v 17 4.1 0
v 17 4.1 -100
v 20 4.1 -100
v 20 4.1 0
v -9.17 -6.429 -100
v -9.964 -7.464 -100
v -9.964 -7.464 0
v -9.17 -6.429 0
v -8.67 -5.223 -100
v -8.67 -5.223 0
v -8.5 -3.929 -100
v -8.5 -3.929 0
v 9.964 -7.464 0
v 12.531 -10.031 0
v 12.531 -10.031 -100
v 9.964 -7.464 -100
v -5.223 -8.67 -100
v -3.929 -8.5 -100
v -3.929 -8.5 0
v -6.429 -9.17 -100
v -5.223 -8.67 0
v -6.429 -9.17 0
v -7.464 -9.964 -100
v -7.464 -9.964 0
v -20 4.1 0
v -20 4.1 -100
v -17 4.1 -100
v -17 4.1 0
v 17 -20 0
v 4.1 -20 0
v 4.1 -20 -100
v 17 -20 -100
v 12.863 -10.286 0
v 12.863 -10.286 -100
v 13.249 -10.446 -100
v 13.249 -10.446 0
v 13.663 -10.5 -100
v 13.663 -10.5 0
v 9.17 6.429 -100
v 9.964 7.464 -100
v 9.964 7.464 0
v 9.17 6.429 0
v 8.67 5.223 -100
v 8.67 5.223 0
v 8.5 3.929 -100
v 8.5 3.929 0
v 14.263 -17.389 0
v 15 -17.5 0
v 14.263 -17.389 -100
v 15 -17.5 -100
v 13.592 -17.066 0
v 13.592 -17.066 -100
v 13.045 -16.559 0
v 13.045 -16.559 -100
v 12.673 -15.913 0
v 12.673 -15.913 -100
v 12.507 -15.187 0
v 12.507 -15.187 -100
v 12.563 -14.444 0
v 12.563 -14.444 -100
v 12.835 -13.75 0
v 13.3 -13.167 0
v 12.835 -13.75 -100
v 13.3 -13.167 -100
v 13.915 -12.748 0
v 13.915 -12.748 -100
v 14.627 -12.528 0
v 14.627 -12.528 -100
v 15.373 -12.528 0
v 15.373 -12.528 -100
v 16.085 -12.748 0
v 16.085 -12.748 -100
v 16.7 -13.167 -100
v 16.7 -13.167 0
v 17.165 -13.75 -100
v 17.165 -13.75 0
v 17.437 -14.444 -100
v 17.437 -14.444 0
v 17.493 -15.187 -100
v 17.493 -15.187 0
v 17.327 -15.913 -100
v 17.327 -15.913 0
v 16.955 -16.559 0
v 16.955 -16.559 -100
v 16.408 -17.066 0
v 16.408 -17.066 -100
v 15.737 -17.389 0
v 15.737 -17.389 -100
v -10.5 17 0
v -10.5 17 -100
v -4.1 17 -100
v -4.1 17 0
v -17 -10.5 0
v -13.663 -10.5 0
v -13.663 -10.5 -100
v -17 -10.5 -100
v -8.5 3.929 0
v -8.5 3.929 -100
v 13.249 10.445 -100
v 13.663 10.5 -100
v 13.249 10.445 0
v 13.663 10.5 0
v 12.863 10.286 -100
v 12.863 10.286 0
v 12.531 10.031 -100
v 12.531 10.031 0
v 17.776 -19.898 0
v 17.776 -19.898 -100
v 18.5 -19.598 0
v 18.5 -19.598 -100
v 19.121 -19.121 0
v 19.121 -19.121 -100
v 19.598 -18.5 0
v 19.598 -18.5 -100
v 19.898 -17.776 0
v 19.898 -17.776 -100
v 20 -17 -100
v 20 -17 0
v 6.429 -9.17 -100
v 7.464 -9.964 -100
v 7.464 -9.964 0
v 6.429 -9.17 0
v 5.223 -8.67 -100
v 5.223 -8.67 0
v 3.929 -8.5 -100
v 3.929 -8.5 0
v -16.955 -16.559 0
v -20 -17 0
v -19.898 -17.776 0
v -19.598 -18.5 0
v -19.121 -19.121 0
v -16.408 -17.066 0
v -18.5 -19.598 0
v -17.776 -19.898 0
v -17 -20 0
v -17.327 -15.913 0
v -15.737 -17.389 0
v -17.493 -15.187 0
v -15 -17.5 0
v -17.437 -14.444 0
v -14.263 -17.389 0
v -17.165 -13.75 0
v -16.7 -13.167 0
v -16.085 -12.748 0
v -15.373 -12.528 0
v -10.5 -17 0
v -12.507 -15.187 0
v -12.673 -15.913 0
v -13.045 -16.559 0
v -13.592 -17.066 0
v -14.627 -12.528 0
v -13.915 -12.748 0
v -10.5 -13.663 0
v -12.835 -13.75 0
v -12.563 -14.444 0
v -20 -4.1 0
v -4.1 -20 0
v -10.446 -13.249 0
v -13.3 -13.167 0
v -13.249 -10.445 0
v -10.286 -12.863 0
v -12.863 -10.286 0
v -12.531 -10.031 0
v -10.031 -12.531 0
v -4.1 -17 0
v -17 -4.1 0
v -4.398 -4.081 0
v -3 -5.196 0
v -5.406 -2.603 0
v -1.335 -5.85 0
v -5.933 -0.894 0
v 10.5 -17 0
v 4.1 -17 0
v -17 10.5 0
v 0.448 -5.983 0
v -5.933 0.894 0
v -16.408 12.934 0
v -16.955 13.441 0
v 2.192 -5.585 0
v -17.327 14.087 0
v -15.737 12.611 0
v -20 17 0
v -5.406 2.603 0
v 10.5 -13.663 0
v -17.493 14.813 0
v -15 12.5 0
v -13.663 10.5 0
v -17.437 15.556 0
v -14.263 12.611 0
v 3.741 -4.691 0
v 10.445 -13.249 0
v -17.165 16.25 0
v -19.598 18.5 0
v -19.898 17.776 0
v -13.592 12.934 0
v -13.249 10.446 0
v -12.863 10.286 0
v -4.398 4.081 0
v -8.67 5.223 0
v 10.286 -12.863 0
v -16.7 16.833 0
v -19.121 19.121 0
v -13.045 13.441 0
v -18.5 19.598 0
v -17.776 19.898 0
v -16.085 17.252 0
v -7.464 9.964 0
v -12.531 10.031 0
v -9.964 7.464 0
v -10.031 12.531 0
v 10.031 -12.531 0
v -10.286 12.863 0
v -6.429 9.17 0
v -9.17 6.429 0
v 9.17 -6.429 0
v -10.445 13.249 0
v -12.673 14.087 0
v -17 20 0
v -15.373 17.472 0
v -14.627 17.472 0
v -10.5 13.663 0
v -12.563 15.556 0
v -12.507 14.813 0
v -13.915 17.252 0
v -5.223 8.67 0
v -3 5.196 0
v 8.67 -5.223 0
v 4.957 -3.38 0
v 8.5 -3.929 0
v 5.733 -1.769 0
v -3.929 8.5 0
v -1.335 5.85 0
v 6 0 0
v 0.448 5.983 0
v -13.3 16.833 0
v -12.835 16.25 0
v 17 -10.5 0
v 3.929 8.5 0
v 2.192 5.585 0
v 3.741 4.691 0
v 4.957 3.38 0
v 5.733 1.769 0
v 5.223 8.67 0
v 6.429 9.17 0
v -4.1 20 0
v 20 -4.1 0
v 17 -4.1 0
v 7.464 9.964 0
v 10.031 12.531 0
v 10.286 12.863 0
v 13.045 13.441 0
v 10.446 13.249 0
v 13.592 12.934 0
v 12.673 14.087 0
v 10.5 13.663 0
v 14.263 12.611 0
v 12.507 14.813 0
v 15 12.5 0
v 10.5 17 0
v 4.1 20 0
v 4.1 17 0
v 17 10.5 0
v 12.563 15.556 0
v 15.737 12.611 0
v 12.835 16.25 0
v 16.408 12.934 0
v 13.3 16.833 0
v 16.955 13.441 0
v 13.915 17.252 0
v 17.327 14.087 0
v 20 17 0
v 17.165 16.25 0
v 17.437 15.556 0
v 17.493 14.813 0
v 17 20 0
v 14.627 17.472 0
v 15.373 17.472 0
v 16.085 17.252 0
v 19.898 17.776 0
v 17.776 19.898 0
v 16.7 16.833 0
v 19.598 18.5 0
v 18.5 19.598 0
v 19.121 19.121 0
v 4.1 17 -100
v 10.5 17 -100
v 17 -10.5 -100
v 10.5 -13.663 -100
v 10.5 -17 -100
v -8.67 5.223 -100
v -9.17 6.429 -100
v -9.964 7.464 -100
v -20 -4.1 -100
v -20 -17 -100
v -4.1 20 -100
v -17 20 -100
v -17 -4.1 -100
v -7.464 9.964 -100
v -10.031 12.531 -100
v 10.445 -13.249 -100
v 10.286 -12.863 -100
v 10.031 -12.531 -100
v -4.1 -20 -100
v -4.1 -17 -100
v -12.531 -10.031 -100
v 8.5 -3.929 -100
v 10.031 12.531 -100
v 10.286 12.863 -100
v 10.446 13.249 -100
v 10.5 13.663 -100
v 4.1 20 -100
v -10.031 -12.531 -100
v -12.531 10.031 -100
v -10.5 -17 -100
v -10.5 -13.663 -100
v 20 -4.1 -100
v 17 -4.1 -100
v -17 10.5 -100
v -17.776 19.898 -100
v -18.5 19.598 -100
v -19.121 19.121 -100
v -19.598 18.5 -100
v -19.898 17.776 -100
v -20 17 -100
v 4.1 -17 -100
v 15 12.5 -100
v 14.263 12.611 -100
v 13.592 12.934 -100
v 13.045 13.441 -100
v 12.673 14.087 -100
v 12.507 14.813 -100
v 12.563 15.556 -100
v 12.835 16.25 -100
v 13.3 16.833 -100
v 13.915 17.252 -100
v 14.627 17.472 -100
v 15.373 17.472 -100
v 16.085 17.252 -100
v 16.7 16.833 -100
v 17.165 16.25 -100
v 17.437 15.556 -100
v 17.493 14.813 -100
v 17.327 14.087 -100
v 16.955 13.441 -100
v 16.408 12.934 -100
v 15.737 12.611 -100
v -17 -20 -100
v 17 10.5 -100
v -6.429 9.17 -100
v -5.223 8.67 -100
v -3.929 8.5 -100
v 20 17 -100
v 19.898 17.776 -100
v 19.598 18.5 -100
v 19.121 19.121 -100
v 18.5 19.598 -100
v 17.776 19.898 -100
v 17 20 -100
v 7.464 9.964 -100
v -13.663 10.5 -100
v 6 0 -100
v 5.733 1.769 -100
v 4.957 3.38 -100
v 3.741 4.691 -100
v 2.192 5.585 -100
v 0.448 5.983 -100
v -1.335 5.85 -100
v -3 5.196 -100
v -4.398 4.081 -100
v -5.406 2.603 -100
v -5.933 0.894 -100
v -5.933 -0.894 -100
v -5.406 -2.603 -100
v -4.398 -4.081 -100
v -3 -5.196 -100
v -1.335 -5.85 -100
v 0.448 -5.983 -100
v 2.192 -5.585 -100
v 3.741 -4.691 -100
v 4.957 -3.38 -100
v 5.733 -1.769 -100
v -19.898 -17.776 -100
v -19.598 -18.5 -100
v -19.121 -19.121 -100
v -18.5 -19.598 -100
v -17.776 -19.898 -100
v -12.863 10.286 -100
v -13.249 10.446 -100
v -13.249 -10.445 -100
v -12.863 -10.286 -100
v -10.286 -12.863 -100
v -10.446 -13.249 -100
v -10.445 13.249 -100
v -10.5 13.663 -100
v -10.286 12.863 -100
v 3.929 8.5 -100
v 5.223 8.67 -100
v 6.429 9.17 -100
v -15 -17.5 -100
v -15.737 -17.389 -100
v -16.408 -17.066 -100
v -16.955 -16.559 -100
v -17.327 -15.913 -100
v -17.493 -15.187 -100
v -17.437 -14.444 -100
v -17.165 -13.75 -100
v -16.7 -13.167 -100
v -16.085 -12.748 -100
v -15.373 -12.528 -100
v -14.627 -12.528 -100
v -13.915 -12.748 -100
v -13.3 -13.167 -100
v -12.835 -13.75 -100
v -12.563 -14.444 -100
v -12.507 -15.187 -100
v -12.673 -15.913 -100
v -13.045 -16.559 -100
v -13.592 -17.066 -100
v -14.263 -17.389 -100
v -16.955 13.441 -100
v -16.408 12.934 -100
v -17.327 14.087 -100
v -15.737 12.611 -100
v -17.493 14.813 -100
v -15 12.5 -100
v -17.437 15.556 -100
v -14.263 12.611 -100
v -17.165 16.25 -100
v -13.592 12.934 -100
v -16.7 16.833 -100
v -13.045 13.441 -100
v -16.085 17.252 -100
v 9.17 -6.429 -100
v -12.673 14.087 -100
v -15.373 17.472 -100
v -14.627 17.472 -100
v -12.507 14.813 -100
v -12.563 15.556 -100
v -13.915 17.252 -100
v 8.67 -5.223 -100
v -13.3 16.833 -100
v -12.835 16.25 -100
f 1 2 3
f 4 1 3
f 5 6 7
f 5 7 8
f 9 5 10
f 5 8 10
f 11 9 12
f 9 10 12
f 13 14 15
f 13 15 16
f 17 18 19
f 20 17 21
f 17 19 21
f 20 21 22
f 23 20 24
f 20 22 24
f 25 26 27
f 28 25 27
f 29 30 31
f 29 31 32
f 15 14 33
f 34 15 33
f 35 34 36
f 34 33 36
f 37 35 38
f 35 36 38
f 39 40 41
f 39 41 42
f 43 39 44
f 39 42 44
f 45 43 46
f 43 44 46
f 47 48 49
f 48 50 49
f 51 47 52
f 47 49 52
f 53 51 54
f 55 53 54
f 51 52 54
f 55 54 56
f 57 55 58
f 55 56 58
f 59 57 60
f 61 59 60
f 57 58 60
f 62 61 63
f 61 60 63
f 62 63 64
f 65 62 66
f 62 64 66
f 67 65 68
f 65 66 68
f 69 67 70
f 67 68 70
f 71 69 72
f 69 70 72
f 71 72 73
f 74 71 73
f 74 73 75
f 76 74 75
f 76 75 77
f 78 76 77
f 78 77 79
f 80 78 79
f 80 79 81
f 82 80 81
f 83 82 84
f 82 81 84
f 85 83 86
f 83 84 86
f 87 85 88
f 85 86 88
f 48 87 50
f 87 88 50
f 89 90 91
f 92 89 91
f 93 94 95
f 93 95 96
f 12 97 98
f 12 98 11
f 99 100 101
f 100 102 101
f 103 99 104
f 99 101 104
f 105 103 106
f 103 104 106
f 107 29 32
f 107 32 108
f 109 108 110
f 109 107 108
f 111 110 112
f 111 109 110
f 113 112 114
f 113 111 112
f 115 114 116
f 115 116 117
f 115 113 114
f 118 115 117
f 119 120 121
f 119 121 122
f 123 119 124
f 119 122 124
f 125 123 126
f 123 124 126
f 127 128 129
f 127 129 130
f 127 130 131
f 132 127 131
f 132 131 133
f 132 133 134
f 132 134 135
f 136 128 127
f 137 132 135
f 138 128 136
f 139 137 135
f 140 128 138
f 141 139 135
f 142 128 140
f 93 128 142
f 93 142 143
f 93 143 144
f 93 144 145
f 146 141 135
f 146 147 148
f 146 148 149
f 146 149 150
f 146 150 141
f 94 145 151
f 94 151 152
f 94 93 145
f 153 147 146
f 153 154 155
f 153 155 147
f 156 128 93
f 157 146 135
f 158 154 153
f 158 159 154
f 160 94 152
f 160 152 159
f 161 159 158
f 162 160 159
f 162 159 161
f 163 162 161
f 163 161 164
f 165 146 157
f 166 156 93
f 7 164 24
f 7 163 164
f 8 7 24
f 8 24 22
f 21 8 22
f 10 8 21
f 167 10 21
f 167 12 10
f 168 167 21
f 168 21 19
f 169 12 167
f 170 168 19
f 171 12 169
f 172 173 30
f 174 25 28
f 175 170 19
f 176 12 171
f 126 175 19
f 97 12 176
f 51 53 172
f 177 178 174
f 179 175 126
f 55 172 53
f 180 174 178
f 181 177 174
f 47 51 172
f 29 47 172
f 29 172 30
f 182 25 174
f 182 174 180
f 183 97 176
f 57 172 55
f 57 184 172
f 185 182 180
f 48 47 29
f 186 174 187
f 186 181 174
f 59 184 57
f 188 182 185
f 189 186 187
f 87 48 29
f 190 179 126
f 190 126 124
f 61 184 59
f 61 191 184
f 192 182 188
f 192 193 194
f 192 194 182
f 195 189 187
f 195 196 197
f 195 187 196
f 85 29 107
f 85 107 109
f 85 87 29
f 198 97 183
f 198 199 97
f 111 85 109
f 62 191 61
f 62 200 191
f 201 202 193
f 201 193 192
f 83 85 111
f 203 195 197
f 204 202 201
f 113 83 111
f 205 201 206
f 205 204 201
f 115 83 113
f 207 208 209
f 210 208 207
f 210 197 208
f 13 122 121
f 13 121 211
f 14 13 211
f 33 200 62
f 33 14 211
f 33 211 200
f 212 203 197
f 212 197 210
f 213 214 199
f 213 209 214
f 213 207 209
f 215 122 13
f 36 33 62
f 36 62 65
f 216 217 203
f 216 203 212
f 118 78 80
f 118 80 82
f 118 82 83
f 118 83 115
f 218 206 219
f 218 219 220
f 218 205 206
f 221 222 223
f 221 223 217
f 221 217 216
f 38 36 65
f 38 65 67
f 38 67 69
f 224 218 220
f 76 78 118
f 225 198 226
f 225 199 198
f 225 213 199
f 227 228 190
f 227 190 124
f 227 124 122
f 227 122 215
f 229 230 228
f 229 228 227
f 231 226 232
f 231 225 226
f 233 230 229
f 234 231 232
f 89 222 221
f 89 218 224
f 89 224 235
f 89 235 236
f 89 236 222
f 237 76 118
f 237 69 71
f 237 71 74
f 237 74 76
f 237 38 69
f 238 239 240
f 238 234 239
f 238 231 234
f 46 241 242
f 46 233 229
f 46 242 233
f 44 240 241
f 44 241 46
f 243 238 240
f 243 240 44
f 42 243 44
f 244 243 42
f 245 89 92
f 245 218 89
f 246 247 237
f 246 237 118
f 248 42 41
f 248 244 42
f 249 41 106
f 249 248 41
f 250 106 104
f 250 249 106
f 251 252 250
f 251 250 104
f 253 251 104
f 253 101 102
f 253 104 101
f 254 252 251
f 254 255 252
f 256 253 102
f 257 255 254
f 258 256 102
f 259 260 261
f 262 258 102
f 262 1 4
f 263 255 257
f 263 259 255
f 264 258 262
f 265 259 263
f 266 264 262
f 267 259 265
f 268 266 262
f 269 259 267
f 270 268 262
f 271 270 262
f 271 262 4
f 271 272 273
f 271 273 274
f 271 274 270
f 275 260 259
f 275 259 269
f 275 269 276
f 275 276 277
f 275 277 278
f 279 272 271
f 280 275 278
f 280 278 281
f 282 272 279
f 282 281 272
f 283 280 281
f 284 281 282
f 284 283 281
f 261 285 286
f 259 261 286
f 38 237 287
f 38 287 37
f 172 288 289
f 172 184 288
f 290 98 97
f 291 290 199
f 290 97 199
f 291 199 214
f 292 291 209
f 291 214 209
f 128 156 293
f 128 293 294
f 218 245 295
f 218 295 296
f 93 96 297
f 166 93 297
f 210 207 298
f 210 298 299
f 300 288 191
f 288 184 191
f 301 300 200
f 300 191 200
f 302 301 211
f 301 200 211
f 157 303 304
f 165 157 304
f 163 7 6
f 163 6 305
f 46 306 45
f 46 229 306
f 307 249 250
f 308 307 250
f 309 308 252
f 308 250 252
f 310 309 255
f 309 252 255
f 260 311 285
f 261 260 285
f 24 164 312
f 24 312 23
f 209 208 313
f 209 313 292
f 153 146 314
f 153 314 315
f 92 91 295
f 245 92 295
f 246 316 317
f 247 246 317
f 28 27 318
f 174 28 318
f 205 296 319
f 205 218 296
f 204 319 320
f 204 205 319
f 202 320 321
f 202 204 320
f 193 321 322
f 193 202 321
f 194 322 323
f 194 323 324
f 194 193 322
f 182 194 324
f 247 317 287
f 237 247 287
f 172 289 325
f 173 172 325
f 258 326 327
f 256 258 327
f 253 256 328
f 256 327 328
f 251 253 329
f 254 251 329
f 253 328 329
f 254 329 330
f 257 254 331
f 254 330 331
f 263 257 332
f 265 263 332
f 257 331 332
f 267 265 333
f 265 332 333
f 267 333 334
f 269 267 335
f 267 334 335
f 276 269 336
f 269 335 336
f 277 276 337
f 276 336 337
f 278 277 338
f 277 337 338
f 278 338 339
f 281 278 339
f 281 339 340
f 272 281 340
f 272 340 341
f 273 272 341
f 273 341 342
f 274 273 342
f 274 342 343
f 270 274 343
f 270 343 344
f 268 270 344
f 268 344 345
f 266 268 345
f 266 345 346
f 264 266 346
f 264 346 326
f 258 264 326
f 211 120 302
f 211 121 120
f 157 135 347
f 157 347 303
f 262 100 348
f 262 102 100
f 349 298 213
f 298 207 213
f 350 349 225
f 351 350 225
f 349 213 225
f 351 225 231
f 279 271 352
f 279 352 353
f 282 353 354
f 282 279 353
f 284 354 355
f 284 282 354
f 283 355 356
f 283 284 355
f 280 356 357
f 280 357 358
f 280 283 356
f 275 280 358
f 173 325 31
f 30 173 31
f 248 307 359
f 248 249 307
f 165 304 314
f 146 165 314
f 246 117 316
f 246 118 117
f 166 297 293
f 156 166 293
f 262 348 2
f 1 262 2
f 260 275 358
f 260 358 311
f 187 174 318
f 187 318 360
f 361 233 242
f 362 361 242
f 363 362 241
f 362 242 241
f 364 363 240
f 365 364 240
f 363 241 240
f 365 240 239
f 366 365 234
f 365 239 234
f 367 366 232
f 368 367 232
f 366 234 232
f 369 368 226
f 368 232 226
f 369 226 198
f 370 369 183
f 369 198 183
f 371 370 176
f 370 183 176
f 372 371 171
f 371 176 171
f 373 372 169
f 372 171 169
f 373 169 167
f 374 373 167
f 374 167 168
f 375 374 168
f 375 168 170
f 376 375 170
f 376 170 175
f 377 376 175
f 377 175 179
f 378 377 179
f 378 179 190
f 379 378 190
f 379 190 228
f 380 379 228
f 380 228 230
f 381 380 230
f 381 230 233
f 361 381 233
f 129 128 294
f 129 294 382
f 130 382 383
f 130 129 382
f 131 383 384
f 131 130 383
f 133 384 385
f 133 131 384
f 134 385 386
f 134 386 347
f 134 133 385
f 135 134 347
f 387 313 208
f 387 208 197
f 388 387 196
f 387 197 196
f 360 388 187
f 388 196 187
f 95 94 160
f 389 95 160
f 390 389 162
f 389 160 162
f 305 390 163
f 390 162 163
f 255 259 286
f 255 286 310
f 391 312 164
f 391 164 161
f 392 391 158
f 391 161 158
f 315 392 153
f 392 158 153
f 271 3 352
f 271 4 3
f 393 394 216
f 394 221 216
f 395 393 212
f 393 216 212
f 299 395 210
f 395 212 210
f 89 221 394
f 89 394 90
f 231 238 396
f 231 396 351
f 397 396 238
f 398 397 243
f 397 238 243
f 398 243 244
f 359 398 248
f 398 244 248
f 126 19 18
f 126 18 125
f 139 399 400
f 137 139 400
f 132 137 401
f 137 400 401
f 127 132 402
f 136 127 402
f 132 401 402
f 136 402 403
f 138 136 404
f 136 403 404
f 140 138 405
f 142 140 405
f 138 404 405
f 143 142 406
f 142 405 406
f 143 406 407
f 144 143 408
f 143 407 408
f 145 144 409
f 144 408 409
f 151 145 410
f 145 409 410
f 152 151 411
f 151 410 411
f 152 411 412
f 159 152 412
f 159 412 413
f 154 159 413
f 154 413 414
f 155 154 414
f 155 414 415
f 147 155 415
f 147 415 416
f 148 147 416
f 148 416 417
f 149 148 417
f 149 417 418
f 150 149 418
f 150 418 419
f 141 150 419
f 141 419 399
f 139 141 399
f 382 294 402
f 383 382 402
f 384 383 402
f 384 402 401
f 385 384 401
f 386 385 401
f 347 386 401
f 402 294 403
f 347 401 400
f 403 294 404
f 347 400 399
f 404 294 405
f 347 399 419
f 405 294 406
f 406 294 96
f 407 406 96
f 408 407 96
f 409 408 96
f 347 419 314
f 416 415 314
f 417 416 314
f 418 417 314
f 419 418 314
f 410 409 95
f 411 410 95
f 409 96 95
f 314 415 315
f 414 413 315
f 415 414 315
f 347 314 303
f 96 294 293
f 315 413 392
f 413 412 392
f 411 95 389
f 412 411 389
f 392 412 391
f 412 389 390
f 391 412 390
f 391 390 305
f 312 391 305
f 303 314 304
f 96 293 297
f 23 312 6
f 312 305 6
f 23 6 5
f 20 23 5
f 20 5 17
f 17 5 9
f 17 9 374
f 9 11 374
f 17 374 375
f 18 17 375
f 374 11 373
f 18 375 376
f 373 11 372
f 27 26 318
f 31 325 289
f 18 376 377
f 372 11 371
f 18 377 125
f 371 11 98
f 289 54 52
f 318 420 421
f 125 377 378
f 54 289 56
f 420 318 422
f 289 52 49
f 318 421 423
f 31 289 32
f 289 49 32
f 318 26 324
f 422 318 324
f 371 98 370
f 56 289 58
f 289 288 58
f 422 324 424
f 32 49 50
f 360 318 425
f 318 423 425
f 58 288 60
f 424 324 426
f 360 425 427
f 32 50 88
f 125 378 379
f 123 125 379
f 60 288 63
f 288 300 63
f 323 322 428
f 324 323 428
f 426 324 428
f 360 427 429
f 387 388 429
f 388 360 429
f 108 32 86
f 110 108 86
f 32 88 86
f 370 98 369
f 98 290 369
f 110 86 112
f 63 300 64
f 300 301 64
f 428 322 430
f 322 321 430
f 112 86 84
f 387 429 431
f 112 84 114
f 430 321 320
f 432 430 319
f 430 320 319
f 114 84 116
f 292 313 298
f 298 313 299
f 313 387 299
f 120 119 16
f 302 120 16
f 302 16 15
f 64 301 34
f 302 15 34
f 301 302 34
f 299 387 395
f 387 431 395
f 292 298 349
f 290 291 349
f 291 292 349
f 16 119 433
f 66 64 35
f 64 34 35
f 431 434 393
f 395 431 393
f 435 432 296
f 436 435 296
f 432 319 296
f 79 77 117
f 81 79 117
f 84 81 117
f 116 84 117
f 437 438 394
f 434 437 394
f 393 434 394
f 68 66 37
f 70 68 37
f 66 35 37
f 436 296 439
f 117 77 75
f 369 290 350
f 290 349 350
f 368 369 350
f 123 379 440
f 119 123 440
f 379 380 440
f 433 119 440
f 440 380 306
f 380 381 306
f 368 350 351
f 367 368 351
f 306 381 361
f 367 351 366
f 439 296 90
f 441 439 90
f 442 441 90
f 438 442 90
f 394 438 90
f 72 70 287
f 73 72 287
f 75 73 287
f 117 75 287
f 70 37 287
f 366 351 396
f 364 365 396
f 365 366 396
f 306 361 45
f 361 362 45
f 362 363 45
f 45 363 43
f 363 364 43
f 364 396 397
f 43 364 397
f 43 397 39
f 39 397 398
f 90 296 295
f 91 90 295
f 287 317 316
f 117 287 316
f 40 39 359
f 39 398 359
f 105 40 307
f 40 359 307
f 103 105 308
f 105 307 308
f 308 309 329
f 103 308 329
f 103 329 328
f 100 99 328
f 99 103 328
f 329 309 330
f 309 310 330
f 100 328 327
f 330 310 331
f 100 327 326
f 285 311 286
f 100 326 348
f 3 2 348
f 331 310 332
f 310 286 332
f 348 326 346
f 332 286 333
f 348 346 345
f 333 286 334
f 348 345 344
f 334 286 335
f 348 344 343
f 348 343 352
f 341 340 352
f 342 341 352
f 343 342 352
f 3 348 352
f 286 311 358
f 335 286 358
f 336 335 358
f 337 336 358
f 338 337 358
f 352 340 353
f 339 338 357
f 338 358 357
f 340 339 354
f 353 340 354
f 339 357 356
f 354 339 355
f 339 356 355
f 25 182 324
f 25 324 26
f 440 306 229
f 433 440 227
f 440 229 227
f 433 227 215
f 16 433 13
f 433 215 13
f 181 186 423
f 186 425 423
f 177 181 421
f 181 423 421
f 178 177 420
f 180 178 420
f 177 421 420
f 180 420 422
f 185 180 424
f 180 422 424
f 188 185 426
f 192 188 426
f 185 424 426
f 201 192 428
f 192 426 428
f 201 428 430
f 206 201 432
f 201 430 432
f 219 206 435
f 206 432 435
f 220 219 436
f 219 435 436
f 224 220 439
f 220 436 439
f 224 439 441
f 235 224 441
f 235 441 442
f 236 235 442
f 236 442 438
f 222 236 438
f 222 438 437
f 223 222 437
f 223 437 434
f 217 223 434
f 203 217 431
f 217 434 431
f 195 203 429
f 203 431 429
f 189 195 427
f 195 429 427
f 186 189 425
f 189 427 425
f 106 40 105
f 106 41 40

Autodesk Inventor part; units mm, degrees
sketch "Skizze_1" plane through (0, 0, 0) normal (0, 0, 1) x (1, 0, 0)
  arc A0 (-20, -17) -> (-17, -20) centre (-17, -17) ccw
  line L0 (-17, -20) -> (-4.1, -20)
  line L1 (-4.1, -20) -> (-4.1, -17)
  line L2 (-4.1, -17) -> (-10.5, -17)
  line L3 (-10.5, -17) -> (-10.5, -13.6627)
  arc A1 (-10.0314, -12.5314) -> (-10.5, -13.6627) centre (-8.9002, -13.6627) ccw
  line L4 (-10.0314, -12.5314) -> (-7.4645, -9.9645)
  arc A2 (-3.9289, -8.5) -> (-7.4645, -9.9645) centre (-3.9289, -13.5) ccw
  line L5 (-3.9289, -8.5) -> (3.9289, -8.5)
  arc A3 (7.4645, -9.9645) -> (3.9289, -8.5) centre (3.9289, -13.5) ccw
  line L6 (7.4645, -9.9645) -> (10.0314, -12.5314)
  arc A4 (10.5, -13.6627) -> (10.0314, -12.5314) centre (8.9002, -13.6627) ccw
  line L7 (10.5, -13.6627) -> (10.5, -17)
  line L8 (10.5, -17) -> (4.1, -17)
  line L9 (4.1, -17) -> (4.1, -20)
  line L10 (4.1, -20) -> (17, -20)
  arc A5 (17, -20) -> (20, -17) centre (17, -17) ccw
  line L11 (20, -17) -> (20, -4.1)
  line L12 (20, -4.1) -> (17, -4.1)
  line L13 (17, -4.1) -> (17, -10.5)
  line L14 (17, -10.5) -> (13.6627, -10.5)
  arc A6 (12.5314, -10.0314) -> (13.6627, -10.5) centre (13.6627, -8.9002) ccw
  line L15 (12.5314, -10.0314) -> (9.9645, -7.4645)
  arc A7 (8.5, -3.9289) -> (9.9645, -7.4645) centre (13.5, -3.9289) ccw
  line L16 (8.5, -3.9289) -> (8.5, 3.9289)
  arc A8 (9.9645, 7.4645) -> (8.5, 3.9289) centre (13.5, 3.9289) ccw
  line L17 (9.9645, 7.4645) -> (12.5314, 10.0314)
  arc A9 (13.6627, 10.5) -> (12.5314, 10.0314) centre (13.6627, 8.9002) ccw
  line L18 (13.6627, 10.5) -> (17, 10.5)
  line L19 (17, 10.5) -> (17, 4.1)
  line L20 (17, 4.1) -> (20, 4.1)
  line L21 (20, 4.1) -> (20, 17)
  arc A10 (20, 17) -> (17, 20) centre (17, 17) ccw
  line L22 (17, 20) -> (4.1, 20)
  line L23 (4.1, 20) -> (4.1, 17)
  line L24 (4.1, 17) -> (10.5, 17)
  line L25 (10.5, 17) -> (10.5, 13.6627)
  arc A11 (10.0314, 12.5314) -> (10.5, 13.6627) centre (8.9002, 13.6627) ccw
  line L26 (10.0314, 12.5314) -> (7.4645, 9.9645)
  arc A12 (3.9289, 8.5) -> (7.4645, 9.9645) centre (3.9289, 13.5) ccw
  line L27 (3.9289, 8.5) -> (-3.9289, 8.5)
  arc A13 (-7.4645, 9.9645) -> (-3.9289, 8.5) centre (-3.9289, 13.5) ccw
  line L28 (-7.4645, 9.9645) -> (-10.0314, 12.5314)
  arc A14 (-10.5, 13.6627) -> (-10.0314, 12.5314) centre (-8.9002, 13.6627) ccw
  line L29 (-10.5, 13.6627) -> (-10.5, 17)
  line L30 (-10.5, 17) -> (-4.1, 17)
  line L31 (-4.1, 17) -> (-4.1, 20)
  line L32 (-4.1, 20) -> (-17, 20)
  arc A15 (-17, 20) -> (-20, 17) centre (-17, 17) ccw
  line L33 (-20, 17) -> (-20, 4.1)
  line L34 (-20, 4.1) -> (-17, 4.1)
  line L35 (-17, 4.1) -> (-17, 10.5)
  line L36 (-17, 10.5) -> (-13.6627, 10.5)
  arc A16 (-12.5314, 10.0314) -> (-13.6627, 10.5) centre (-13.6627, 8.9002) ccw
  line L37 (-12.5314, 10.0314) -> (-9.9645, 7.4645)
  arc A17 (-8.5, 3.9289) -> (-9.9645, 7.4645) centre (-13.5, 3.9289) ccw
  line L38 (-8.5, 3.9289) -> (-8.5, -3.9289)
  arc A18 (-9.9645, -7.4645) -> (-8.5, -3.9289) centre (-13.5, -3.9289) ccw
  line L39 (-9.9645, -7.4645) -> (-12.5314, -10.0314)
  arc A19 (-13.6627, -10.5) -> (-12.5314, -10.0314) centre (-13.6627, -8.9002) ccw
  line L40 (-13.6627, -10.5) -> (-17, -10.5)
  line L41 (-17, -10.5) -> (-17, -4.1)
  line L42 (-17, -4.1) -> (-20, -4.1)
  line L43 (-20, -4.1) -> (-20, -17)
  circle A20 centre (0, 0) radius 6
extrude "Extrusion1" add sketch "Skizze_1" against normal blind 100
sketch "Sketch2" plane through (0, 0, 0) normal (0, 0, 1) x (1, 0, 0)
  point P0 (-15, -15)
hole "Drilling 1" at (-15, -15, 0) direction (0, 0, -1) diameter 5 depth 6000
sketch "Sketch3" plane through (0, 0, 0) normal (0, 0, 1) x (1, 0, 0)
  point P0 (15, -15)
hole "Drilling 2" at (15, -15, 0) direction (0, 0, -1) diameter 5 depth 6000
sketch "Sketch4" plane through (0, 0, 0) normal (0, 0, 1) x (1, 0, 0)
  point P0 (15, 15)
hole "Drilling 3" at (15, 15, 0) direction (0, 0, -1) diameter 5 depth 6000
sketch "Sketch5" plane through (0, 0, 0) normal (0, 0, 1) x (1, 0, 0)
  point P0 (-15, 15)
hole "Drilling 4" at (-15, 15, 0) direction (0, 0, -1) diameter 5 depth 6000
ref_plane "side_4d_XY" through (-20, 0, -330) normal (-1, 0, 0) x (0, 1, 0)
ref_plane "side_4d_YZ" through (-20, 0, -330) normal (0, 1, 0) x (0, 0, -1)
ref_plane "side_4d_ZX" through (-20, 0, -330) normal (0, 0, -1) x (-1, 0, 0)
ref_plane "side_1a_XY" through (0, 20, -330) normal (0, 1, 0) x (1, 0, 0)
ref_plane "side_1a_YZ" through (0, 20, -330) normal (1, 0, 0) x (0, 0, -1)
ref_plane "side_1a_ZX" through (0, 20, -330) normal (0, 0, -1) x (0, 1, 0)
ref_plane "side_2b_XY" through (20, 0, -330) normal (1, 0, 0) x (0, -1, 0)
ref_plane "side_2b_YZ" through (20, 0, -330) normal (0, -1, 0) x (0, 0, -1)
ref_plane "side_2b_ZX" through (20, 0, -330) normal (0, 0, -1) x (1, 0, 0)
ref_plane "side_3c_XY" through (0, -20, -330) normal (0, -1, 0) x (-1, 0, 0)
ref_plane "side_3c_YZ" through (0, -20, -330) normal (-1, 0, 0) x (0, 0, -1)
ref_plane "side_3c_ZX" through (0, -20, -330) normal (0, 0, -1) x (0, -1, 0)
ref_plane "end_XY" through (0, 0, -660) normal (0, 0, -1) x (1, 0, 0)
ref_plane "end_YZ" through (0, 0, -660) normal (1, 0, 0) x (0, -1, 0)
ref_plane "end_ZX" through (0, 0, -660) normal (0, -1, 0) x (0, 0, -1)
ref_plane "start_XY" through (0, 0, 0) normal (0, 0, 1) x (1, 0, 0)
ref_plane "start_YZ" through (0, 0, 0) normal (1, 0, 0) x (0, 1, 0)
ref_plane "start_ZX" through (0, 0, 0) normal (0, 1, 0) x (0, 0, 1)
properties part number "MayTec 1.11.040040.43S_Profile 40x40, 4E, S_100_Detail_(0;0,0,0)"
